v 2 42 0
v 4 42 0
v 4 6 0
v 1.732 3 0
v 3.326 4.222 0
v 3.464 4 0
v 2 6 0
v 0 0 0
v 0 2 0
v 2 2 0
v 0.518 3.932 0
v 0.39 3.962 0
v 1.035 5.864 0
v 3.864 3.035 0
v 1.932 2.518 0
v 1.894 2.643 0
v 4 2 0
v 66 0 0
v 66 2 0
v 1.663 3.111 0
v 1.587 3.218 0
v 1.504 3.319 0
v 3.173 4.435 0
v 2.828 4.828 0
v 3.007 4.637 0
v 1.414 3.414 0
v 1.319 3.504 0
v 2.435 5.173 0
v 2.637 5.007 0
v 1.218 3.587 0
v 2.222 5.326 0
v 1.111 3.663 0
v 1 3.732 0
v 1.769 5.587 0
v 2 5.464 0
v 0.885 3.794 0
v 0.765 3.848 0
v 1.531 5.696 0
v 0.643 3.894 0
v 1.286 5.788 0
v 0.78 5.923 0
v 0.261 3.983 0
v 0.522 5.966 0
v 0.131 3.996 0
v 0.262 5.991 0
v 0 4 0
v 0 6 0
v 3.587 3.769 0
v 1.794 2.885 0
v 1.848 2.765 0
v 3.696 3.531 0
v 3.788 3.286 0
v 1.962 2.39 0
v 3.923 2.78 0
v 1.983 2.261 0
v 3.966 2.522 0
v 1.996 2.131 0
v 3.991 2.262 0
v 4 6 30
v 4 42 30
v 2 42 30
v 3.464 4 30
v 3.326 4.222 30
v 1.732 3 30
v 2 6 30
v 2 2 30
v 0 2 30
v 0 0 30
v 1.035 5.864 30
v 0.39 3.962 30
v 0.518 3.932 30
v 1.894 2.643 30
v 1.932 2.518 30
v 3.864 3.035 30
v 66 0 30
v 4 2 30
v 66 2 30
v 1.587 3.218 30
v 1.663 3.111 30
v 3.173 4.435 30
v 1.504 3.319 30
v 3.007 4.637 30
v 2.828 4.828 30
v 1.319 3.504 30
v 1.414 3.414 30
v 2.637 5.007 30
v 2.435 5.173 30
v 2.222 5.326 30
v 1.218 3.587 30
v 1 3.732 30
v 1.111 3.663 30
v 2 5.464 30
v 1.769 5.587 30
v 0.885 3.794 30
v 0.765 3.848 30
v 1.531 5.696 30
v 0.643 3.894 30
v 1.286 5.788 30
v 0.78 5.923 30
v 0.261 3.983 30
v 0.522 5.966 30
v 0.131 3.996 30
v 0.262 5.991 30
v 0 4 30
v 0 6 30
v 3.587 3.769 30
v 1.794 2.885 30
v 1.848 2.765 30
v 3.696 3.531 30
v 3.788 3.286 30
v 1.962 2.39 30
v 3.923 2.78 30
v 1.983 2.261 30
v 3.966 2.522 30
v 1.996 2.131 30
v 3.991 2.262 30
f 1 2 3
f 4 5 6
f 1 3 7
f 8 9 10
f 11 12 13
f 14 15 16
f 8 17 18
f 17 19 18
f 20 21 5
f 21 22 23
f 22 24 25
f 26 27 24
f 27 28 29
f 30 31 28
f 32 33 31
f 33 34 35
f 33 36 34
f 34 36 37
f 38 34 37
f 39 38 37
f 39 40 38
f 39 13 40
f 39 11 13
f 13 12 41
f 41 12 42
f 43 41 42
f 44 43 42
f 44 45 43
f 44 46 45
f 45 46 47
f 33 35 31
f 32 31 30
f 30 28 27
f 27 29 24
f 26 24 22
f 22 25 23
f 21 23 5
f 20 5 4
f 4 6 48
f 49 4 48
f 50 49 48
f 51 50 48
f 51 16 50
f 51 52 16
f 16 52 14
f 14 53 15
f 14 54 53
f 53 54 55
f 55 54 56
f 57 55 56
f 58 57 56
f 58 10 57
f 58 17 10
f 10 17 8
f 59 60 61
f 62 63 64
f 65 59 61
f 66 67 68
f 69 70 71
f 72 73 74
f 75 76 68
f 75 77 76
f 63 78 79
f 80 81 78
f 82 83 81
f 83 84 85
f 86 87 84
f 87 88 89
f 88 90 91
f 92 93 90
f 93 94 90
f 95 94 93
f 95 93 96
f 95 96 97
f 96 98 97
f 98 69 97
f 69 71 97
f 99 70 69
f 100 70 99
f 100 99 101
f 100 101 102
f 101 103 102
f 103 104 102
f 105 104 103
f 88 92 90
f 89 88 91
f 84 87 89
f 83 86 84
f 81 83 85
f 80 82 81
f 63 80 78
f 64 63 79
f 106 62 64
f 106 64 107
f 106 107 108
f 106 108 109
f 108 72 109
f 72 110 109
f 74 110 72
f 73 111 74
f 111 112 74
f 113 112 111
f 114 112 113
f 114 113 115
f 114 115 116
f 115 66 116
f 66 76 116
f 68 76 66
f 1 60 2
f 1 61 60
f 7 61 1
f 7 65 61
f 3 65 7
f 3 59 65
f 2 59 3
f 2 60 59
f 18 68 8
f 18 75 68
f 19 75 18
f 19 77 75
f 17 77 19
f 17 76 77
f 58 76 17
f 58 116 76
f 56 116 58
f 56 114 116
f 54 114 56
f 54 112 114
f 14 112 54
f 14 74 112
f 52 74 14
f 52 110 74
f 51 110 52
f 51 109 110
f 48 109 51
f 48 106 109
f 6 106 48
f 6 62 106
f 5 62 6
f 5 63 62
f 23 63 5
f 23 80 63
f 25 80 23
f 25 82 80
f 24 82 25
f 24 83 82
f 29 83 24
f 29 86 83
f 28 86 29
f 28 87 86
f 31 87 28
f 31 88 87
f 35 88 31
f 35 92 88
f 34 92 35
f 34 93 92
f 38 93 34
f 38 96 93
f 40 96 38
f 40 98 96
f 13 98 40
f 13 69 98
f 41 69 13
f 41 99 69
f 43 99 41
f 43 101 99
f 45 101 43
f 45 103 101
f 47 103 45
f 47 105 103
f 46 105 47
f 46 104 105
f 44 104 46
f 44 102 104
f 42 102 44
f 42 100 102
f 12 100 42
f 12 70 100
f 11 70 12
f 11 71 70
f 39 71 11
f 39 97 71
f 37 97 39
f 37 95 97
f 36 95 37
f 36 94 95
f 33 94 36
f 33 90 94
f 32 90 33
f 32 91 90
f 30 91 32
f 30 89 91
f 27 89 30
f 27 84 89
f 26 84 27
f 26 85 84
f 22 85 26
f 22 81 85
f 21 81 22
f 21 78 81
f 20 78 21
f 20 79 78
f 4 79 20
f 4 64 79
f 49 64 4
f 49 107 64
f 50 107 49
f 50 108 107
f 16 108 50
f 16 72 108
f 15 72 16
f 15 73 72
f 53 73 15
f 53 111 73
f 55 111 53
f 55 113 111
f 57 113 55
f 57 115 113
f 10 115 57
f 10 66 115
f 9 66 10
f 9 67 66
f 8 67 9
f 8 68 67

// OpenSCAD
// Units: mm
$fn = 96;

thickness_mm = 2.0;
bend_radius_mm = 2.0;
k_factor = 0.45;
bend_angle_deg = 90;

outside_flange_a_mm = 70.0;
outside_flange_b_mm = 40.0;
width_mm = 30.0;

neutral_radius_mm = bend_radius_mm + k_factor * thickness_mm;
bend_allowance_mm = PI / 2 * neutral_radius_mm;
outside_setback_mm = (bend_radius_mm + thickness_mm) * tan(bend_angle_deg / 2);
bend_deduction_mm = 2 * outside_setback_mm - bend_allowance_mm;
developed_flat_length_mm = outside_flange_a_mm + outside_flange_b_mm - bend_deduction_mm;

straight_a_mm = outside_flange_a_mm - outside_setback_mm;
straight_b_mm = outside_flange_b_mm - outside_setback_mm;

echo(str(
    "MAKERBENCH-SHEETMETAL: {",
    "\"thickness_mm\":", thickness_mm, ",",
    "\"bend_radius_mm\":", bend_radius_mm, ",",
    "\"developed_flat_length_mm\":", developed_flat_length_mm,
    "}"
));

module bend_cross_section() {
    union() {
        square([straight_a_mm, thickness_mm], center = false);

        translate([0, thickness_mm])
            difference() {
                circle(r = bend_radius_mm + thickness_mm);
                circle(r = bend_radius_mm);
                translate([-(bend_radius_mm + thickness_mm + 1), -(bend_radius_mm + thickness_mm + 1)])
                    square([bend_radius_mm + thickness_mm + 1, 2 * (bend_radius_mm + thickness_mm + 2)]);
                translate([-(bend_radius_mm + thickness_mm + 1), -(bend_radius_mm + thickness_mm + 1)])
                    square([2 * (bend_radius_mm + thickness_mm + 2), bend_radius_mm + thickness_mm + 1]);
            }

        translate([bend_radius_mm, thickness_mm + bend_radius_mm + thickness_mm])
            square([thickness_mm, straight_b_mm], center = false);
    }
}

linear_extrude(height = width_mm, convexity = 10)
    bend_cross_section();
